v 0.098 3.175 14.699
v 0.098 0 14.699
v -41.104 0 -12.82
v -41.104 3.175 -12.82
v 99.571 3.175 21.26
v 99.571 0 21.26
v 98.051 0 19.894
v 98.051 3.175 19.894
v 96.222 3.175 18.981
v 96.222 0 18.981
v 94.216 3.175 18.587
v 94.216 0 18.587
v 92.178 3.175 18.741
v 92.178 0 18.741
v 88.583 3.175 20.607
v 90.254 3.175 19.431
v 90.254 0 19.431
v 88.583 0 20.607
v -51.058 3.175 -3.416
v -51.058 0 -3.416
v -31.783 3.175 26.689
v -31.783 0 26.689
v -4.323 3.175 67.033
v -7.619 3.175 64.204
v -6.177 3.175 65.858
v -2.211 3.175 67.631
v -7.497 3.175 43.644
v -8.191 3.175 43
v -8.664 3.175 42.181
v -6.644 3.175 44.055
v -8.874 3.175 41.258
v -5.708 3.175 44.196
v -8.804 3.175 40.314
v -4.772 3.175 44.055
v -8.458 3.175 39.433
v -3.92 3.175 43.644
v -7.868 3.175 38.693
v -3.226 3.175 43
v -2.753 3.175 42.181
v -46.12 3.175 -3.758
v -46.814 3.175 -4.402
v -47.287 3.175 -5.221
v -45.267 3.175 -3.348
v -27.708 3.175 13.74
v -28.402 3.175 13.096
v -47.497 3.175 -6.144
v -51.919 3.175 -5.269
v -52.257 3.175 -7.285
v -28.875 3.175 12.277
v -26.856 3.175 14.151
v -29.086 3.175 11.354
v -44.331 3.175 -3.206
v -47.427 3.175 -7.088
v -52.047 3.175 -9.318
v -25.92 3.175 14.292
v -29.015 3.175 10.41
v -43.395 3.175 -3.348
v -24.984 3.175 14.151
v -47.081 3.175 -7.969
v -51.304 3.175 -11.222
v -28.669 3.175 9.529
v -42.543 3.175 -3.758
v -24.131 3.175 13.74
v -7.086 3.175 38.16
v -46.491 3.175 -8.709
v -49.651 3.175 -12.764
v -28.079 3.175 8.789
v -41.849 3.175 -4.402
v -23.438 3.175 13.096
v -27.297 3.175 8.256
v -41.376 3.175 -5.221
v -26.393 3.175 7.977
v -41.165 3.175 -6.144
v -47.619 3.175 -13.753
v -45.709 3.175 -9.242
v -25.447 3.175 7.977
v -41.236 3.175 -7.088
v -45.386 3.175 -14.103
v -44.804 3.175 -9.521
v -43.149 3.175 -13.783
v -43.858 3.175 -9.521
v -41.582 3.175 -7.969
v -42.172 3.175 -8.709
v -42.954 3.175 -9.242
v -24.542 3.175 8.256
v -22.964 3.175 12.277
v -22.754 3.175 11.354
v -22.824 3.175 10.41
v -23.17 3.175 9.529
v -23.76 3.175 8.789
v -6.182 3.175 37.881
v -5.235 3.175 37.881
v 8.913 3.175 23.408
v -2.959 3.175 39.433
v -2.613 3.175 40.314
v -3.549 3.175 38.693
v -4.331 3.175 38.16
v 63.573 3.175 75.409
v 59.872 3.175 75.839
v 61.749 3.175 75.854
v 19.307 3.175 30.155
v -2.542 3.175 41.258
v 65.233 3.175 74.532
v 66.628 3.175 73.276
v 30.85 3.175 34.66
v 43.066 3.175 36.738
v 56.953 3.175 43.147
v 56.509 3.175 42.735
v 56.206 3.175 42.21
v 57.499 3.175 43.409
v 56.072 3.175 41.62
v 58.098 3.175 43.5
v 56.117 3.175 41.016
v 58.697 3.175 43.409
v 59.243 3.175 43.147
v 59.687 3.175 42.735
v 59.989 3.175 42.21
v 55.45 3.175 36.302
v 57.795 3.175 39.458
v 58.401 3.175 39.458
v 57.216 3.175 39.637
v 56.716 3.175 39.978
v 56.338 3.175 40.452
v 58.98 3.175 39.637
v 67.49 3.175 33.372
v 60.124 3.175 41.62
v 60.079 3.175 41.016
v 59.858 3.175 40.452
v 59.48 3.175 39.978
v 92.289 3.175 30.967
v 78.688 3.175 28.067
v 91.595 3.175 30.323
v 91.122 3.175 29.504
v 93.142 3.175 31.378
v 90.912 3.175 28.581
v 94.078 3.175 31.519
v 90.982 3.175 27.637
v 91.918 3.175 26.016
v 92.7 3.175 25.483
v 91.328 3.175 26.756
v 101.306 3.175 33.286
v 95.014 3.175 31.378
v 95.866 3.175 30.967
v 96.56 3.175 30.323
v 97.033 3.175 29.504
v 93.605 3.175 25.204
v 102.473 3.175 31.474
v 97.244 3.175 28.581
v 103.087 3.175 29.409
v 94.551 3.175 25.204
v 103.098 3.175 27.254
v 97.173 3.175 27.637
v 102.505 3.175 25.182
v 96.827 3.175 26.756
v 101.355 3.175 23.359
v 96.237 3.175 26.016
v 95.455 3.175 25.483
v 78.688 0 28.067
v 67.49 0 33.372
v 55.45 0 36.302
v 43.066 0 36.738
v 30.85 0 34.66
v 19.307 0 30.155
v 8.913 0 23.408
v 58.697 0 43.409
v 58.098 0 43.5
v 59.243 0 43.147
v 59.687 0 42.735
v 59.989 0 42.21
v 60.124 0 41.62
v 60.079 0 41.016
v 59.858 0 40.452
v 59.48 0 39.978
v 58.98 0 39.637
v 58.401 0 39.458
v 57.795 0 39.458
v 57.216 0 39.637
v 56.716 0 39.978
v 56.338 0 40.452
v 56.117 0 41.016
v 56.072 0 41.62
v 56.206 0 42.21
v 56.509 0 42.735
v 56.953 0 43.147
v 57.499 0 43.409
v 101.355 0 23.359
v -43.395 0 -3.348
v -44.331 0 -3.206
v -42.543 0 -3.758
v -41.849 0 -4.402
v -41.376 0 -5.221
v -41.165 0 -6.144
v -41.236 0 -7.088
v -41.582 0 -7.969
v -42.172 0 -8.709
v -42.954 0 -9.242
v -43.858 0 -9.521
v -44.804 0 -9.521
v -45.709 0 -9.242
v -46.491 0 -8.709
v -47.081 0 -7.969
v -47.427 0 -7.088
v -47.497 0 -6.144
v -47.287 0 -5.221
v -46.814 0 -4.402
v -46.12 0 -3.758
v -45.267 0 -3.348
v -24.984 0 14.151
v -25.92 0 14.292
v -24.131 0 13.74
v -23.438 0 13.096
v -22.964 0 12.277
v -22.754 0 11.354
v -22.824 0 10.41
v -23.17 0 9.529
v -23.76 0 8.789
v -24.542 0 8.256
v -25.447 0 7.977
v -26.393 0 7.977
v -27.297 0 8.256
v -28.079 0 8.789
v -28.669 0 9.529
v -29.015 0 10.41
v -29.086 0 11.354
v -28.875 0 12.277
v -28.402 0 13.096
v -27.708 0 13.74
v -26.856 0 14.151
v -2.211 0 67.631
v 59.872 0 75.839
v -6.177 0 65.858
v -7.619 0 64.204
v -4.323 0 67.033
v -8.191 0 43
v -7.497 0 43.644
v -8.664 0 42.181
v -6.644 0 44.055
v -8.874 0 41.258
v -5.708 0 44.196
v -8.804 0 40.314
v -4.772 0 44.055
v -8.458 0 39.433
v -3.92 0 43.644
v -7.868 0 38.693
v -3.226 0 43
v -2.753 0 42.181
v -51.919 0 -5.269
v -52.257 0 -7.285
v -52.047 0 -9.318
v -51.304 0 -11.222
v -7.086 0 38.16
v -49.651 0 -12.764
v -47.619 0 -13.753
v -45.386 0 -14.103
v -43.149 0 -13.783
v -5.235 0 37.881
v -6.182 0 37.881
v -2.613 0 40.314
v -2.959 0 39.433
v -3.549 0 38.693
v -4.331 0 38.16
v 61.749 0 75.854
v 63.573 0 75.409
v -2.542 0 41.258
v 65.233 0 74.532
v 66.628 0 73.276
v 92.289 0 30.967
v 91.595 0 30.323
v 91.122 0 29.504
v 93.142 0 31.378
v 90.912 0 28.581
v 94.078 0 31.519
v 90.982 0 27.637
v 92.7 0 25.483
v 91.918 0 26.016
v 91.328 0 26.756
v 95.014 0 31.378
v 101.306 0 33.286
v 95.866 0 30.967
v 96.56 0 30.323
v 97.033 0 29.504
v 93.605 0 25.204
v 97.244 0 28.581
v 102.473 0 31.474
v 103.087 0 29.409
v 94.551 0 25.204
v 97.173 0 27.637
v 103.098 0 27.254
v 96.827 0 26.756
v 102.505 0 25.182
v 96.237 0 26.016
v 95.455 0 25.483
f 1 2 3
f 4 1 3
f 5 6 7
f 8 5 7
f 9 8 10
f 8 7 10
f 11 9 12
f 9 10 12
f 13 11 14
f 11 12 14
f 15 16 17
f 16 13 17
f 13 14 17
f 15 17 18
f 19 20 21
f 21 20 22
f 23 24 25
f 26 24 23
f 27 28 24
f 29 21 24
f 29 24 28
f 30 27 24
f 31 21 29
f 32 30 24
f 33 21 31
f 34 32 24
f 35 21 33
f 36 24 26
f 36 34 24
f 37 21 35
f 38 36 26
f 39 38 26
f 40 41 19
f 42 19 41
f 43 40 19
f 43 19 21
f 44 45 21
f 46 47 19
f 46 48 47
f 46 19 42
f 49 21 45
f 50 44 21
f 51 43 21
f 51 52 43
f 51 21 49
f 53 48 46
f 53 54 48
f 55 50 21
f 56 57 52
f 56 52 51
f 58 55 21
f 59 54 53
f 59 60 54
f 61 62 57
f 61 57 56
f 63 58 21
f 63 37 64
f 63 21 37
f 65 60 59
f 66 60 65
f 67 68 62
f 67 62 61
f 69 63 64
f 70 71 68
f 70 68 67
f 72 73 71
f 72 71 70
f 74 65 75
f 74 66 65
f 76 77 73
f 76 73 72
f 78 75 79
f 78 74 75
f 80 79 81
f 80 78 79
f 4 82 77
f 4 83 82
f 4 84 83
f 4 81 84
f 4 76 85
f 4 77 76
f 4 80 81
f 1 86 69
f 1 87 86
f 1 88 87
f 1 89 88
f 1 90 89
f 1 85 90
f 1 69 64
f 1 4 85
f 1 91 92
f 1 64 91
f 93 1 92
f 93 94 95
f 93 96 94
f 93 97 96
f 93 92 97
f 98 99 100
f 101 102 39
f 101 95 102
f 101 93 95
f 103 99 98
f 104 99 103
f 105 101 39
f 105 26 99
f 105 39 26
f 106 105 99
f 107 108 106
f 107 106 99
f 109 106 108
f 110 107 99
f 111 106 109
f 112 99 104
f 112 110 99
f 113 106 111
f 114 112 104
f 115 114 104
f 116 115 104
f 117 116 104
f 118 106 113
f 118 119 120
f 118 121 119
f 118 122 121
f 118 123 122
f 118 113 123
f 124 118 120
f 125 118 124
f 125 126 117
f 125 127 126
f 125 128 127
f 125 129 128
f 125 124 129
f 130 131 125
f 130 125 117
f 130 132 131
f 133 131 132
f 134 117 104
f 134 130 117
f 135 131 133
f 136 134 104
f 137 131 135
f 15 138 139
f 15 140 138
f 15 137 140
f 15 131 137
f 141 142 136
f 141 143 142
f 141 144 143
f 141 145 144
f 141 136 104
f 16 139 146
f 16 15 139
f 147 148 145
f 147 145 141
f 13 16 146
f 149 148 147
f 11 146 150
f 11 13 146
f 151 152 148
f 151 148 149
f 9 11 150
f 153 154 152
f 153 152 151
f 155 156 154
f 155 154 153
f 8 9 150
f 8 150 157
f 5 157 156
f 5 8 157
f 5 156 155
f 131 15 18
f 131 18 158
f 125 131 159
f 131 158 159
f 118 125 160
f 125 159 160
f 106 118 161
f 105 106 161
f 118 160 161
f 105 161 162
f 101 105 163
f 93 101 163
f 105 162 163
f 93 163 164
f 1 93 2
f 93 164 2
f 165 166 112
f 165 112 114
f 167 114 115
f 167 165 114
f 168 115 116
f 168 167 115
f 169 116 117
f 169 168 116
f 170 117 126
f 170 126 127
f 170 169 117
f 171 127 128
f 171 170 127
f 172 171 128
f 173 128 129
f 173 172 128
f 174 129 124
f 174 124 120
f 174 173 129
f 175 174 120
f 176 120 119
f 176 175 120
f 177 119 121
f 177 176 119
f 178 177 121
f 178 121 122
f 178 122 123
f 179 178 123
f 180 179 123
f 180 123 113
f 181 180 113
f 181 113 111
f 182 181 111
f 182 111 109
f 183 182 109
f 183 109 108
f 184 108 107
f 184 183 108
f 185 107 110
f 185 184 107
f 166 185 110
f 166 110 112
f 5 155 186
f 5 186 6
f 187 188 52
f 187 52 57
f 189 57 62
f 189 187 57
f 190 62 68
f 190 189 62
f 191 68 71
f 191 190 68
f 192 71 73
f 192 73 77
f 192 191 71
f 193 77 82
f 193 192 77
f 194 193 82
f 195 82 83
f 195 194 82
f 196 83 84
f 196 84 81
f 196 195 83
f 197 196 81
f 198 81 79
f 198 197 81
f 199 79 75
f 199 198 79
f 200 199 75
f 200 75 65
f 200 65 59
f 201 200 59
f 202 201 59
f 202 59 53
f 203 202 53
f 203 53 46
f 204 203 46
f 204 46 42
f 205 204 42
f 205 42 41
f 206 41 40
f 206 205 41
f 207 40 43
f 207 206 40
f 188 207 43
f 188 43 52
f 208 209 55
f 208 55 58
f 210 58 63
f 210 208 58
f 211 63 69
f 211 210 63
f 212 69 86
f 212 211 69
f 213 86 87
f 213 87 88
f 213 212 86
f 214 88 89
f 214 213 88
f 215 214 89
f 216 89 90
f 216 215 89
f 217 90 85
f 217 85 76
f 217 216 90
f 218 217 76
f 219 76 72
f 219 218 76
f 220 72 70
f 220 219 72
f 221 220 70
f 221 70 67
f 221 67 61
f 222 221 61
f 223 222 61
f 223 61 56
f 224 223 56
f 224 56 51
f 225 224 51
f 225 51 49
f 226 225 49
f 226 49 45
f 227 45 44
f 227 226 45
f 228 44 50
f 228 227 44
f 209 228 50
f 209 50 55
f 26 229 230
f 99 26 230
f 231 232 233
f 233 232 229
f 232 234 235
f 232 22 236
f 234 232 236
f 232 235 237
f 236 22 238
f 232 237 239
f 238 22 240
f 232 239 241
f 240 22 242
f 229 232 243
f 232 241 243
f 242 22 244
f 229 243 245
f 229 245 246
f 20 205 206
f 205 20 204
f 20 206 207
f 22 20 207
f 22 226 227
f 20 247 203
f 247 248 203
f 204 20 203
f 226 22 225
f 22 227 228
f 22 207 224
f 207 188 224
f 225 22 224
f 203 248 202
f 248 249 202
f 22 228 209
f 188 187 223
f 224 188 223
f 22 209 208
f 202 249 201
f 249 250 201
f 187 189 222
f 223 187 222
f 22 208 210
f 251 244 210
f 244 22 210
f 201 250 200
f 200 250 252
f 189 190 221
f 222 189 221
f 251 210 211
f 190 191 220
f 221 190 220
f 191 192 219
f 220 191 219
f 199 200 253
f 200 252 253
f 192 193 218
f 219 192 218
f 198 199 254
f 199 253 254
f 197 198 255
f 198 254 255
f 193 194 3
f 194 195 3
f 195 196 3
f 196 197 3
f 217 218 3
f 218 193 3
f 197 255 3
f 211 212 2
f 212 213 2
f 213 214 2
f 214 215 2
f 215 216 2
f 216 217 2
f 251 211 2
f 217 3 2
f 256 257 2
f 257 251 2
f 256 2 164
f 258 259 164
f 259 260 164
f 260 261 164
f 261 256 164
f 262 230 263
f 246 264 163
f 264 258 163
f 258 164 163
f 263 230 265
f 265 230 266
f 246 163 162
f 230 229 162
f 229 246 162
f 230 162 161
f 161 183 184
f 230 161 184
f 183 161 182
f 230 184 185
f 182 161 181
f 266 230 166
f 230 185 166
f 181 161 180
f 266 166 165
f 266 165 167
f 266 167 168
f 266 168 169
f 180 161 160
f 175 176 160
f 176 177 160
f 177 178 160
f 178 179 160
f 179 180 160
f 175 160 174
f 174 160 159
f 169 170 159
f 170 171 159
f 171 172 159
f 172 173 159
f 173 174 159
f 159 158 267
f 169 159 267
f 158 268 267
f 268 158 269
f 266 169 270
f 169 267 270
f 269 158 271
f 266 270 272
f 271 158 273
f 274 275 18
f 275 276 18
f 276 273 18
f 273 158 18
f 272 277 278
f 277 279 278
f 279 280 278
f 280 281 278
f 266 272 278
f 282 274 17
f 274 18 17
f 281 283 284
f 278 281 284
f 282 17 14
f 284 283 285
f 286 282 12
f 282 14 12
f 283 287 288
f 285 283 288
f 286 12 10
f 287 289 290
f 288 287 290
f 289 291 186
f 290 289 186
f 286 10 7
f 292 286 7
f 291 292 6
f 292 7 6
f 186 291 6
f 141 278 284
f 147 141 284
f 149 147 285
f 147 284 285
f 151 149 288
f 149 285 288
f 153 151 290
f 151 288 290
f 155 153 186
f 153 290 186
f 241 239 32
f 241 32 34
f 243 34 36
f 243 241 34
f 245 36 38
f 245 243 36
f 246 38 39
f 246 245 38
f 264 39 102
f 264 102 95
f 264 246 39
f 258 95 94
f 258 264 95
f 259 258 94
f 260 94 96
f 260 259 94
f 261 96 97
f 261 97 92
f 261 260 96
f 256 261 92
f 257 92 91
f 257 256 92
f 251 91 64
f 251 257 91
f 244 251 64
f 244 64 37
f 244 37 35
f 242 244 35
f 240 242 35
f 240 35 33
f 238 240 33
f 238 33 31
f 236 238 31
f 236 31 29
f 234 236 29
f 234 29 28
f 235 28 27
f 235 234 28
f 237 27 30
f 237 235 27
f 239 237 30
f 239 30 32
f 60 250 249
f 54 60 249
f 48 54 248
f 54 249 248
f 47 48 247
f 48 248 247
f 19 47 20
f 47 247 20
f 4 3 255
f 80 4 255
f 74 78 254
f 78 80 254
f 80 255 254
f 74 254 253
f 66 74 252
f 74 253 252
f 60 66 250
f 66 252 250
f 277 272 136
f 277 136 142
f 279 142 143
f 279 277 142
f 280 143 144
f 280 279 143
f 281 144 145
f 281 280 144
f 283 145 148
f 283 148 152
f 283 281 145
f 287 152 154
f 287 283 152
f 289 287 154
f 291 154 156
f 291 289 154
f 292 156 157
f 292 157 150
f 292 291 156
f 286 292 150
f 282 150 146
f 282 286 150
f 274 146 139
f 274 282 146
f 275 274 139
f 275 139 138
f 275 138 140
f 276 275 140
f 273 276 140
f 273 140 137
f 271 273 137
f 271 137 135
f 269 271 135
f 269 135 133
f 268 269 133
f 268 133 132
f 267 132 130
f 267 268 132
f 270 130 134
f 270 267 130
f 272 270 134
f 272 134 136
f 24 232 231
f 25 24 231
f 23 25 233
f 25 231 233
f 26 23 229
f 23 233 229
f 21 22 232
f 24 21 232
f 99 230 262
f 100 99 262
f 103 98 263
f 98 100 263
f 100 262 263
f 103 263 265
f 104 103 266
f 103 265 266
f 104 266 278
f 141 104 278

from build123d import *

# Parameters (mm, degrees)
SKETCH1_R           = 3.175
SKETCH1_R_2         = 2.032
BOSS_EXTRUDE1_DEPTH = 3.175
FILLET1_R           = 7.62


with BuildPart() as part:
    # Sketch1 → Boss-Extrude1 (new body)
    # profile 1 of 2: a face of its own
    with BuildSketch(Plane(origin=(0, 0, 0), x_dir=(1, 0, 0), z_dir=(0, 1, 0))):
        with BuildLine():
            Line((105.591118199, -28.343622072), (94.077776645, -14.794770967))
            ThreePointArc((94.077776645, -14.794770967), (47.065246085, -36.873172811), (0.097776645, -14.699073687))
            Line((0.097776645, -14.699073687), (-31.782789553, -26.688950722))
            Line((-31.782789553, -26.688950722), (-5.708312831, -67.169135043))
            Line((-5.708312831, -67.169135043), (63.939848964, -76.376354726))
            Line((63.939848964, -76.376354726), (105.591118199, -28.343622072))
        make_face()
        with Locations(Location((-5.708312831, -41.020609427, 0), (0, 0, 270))):
            Circle(SKETCH1_R, mode=Mode.SUBTRACT)
        with Locations(Location((58.097885383, -41.467741904, 0), (0, 0, 270))):
            Circle(SKETCH1_R_2, mode=Mode.SUBTRACT)
        with Locations(Location((94.077776645, -28.343622072, 0), (0, 0, 270))):
            Circle(SKETCH1_R, mode=Mode.SUBTRACT)
    # profile 2 of 2: a face of its own
    with BuildSketch(Plane(origin=(0, 0, 0), x_dir=(1, 0, 0), z_dir=(0, 1, 0))):
        Polygon((-31.782789553, -26.688950722), (0.097776645, -14.699073687), (-47.44057022, 17.052204331), (-53.745234427, 7.612794876), align=None)
        with Locations(Location((-25.919844617, -11.116586696, 0), (0, 0, 270))):
            Circle(SKETCH1_R, mode=Mode.SUBTRACT)
        with Locations(Location((-44.331222359, 6.381446612, 0), (0, 0, 270))):
            Circle(SKETCH1_R, mode=Mode.SUBTRACT)
    extrude(amount=BOSS_EXTRUDE1_DEPTH)

    # Fillet1
    # the kernel refuses this fillet: 7.62 mm, written as the material it takes off along each edge
    with BuildSketch(Plane(origin=(94.077776645, -21.209715088, 14.794770967), x_dir=(0.6475445193715758, 0, 0.7620276211738226), z_dir=(0, 1, 0))) as fillet1_piece_1:
        with BuildLine():
            CenterArc((8.483886035, -7.62), FILLET1_R, 90, 92.490451597)
            ThreePointArc((0.871083301, -7.951111055), (0.566092443, -3.961253046), (0, 0))
            Line((0, 0), (8.483886035, 0))
        make_face()
    extrude(amount=45.594430177, mode=Mode.SUBTRACT)
    with BuildSketch(Plane(origin=(105.591118199, -16.352843569, 28.343622072), x_dir=(-0.6551362182138352, 0, 0.755510777940642), z_dir=(0, 1, 0))) as fillet1_piece_2:
        with BuildLine():
            CenterArc((FILLET1_R * 0.858416985261, -FILLET1_R), FILLET1_R, 90, 81.28670352)
            Line((-FILLET1_R * 0.130041772231, -FILLET1_R * 0.848509786661), (0, 0))
            Line((0, 0), (FILLET1_R * 0.858416985261, 0))
        make_face()
    extrude(amount=35.880687138, mode=Mode.SUBTRACT)
    with BuildSketch(Plane(origin=(63.939848964, -10.25750483, 76.376354726), x_dir=(0.6551362182138344, 0, -0.7555107779406426), z_dir=(0, 1, 0))) as fillet1_piece_3:
        with BuildLine():
            CenterArc((FILLET1_R * 0.538451697109, FILLET1_R), FILLET1_R, 213.399362726, 56.600637274)
            Line((-FILLET1_R * 0.296402288845, FILLET1_R * 0.449528545576), (0, 0))
            Line((0, 0), (FILLET1_R * 0.538451697109, 0))
        make_face()
    extrude(amount=23.69000966, mode=Mode.SUBTRACT)
    with BuildSketch(Plane(origin=(-5.708312831, -8.81900629, 67.169135043), x_dir=(0.9913749712814725, 0, 0.13105596635277514), z_dir=(0, 1, 0))) as fillet1_piece_4:
        with BuildLine():
            CenterArc((FILLET1_R * 0.462939962752, FILLET1_R), FILLET1_R, 220.317392239, 49.682607761)
            Line((-FILLET1_R * 0.29953199758, FILLET1_R * 0.352978740916), (0, 0))
            Line((0, 0), (FILLET1_R * 0.462939962752, 0))
        make_face()
    extrude(amount=20.813012581, mode=Mode.SUBTRACT)
    with BuildSketch(Plane(origin=(-47.44057022, -19.05, -17.052204331), x_dir=(0.8315732701891384, 0, 0.5554150666906167), z_dir=(0, 1, 0))) as fillet1_piece_5:
        with BuildLine():
            CenterArc((FILLET1_R, -FILLET1_R), FILLET1_R, 90, 90)
            Line((0, -FILLET1_R), (0, 0))
            Line((0, 0), (FILLET1_R, 0))
        make_face()
    extrude(amount=41.275, mode=Mode.SUBTRACT)
    with BuildSketch(Plane(origin=(-53.745234427, -12.458754806, -7.612794876), x_dir=(0.5392161516528728, 0, 0.8421674072277234), z_dir=(0, 1, 0))) as fillet1_piece_6:
        with BuildLine():
            CenterArc((FILLET1_R * 0.654002876977, FILLET1_R), FILLET1_R, 203.630396876, 66.369603124)
            Line((-FILLET1_R * 0.262147328242, FILLET1_R * 0.599164869956), (0, 0))
            Line((0, 0), (FILLET1_R * 0.654002876977, 0))
        make_face()
    extrude(amount=28.092509613, mode=Mode.SUBTRACT)


solid = part.part
